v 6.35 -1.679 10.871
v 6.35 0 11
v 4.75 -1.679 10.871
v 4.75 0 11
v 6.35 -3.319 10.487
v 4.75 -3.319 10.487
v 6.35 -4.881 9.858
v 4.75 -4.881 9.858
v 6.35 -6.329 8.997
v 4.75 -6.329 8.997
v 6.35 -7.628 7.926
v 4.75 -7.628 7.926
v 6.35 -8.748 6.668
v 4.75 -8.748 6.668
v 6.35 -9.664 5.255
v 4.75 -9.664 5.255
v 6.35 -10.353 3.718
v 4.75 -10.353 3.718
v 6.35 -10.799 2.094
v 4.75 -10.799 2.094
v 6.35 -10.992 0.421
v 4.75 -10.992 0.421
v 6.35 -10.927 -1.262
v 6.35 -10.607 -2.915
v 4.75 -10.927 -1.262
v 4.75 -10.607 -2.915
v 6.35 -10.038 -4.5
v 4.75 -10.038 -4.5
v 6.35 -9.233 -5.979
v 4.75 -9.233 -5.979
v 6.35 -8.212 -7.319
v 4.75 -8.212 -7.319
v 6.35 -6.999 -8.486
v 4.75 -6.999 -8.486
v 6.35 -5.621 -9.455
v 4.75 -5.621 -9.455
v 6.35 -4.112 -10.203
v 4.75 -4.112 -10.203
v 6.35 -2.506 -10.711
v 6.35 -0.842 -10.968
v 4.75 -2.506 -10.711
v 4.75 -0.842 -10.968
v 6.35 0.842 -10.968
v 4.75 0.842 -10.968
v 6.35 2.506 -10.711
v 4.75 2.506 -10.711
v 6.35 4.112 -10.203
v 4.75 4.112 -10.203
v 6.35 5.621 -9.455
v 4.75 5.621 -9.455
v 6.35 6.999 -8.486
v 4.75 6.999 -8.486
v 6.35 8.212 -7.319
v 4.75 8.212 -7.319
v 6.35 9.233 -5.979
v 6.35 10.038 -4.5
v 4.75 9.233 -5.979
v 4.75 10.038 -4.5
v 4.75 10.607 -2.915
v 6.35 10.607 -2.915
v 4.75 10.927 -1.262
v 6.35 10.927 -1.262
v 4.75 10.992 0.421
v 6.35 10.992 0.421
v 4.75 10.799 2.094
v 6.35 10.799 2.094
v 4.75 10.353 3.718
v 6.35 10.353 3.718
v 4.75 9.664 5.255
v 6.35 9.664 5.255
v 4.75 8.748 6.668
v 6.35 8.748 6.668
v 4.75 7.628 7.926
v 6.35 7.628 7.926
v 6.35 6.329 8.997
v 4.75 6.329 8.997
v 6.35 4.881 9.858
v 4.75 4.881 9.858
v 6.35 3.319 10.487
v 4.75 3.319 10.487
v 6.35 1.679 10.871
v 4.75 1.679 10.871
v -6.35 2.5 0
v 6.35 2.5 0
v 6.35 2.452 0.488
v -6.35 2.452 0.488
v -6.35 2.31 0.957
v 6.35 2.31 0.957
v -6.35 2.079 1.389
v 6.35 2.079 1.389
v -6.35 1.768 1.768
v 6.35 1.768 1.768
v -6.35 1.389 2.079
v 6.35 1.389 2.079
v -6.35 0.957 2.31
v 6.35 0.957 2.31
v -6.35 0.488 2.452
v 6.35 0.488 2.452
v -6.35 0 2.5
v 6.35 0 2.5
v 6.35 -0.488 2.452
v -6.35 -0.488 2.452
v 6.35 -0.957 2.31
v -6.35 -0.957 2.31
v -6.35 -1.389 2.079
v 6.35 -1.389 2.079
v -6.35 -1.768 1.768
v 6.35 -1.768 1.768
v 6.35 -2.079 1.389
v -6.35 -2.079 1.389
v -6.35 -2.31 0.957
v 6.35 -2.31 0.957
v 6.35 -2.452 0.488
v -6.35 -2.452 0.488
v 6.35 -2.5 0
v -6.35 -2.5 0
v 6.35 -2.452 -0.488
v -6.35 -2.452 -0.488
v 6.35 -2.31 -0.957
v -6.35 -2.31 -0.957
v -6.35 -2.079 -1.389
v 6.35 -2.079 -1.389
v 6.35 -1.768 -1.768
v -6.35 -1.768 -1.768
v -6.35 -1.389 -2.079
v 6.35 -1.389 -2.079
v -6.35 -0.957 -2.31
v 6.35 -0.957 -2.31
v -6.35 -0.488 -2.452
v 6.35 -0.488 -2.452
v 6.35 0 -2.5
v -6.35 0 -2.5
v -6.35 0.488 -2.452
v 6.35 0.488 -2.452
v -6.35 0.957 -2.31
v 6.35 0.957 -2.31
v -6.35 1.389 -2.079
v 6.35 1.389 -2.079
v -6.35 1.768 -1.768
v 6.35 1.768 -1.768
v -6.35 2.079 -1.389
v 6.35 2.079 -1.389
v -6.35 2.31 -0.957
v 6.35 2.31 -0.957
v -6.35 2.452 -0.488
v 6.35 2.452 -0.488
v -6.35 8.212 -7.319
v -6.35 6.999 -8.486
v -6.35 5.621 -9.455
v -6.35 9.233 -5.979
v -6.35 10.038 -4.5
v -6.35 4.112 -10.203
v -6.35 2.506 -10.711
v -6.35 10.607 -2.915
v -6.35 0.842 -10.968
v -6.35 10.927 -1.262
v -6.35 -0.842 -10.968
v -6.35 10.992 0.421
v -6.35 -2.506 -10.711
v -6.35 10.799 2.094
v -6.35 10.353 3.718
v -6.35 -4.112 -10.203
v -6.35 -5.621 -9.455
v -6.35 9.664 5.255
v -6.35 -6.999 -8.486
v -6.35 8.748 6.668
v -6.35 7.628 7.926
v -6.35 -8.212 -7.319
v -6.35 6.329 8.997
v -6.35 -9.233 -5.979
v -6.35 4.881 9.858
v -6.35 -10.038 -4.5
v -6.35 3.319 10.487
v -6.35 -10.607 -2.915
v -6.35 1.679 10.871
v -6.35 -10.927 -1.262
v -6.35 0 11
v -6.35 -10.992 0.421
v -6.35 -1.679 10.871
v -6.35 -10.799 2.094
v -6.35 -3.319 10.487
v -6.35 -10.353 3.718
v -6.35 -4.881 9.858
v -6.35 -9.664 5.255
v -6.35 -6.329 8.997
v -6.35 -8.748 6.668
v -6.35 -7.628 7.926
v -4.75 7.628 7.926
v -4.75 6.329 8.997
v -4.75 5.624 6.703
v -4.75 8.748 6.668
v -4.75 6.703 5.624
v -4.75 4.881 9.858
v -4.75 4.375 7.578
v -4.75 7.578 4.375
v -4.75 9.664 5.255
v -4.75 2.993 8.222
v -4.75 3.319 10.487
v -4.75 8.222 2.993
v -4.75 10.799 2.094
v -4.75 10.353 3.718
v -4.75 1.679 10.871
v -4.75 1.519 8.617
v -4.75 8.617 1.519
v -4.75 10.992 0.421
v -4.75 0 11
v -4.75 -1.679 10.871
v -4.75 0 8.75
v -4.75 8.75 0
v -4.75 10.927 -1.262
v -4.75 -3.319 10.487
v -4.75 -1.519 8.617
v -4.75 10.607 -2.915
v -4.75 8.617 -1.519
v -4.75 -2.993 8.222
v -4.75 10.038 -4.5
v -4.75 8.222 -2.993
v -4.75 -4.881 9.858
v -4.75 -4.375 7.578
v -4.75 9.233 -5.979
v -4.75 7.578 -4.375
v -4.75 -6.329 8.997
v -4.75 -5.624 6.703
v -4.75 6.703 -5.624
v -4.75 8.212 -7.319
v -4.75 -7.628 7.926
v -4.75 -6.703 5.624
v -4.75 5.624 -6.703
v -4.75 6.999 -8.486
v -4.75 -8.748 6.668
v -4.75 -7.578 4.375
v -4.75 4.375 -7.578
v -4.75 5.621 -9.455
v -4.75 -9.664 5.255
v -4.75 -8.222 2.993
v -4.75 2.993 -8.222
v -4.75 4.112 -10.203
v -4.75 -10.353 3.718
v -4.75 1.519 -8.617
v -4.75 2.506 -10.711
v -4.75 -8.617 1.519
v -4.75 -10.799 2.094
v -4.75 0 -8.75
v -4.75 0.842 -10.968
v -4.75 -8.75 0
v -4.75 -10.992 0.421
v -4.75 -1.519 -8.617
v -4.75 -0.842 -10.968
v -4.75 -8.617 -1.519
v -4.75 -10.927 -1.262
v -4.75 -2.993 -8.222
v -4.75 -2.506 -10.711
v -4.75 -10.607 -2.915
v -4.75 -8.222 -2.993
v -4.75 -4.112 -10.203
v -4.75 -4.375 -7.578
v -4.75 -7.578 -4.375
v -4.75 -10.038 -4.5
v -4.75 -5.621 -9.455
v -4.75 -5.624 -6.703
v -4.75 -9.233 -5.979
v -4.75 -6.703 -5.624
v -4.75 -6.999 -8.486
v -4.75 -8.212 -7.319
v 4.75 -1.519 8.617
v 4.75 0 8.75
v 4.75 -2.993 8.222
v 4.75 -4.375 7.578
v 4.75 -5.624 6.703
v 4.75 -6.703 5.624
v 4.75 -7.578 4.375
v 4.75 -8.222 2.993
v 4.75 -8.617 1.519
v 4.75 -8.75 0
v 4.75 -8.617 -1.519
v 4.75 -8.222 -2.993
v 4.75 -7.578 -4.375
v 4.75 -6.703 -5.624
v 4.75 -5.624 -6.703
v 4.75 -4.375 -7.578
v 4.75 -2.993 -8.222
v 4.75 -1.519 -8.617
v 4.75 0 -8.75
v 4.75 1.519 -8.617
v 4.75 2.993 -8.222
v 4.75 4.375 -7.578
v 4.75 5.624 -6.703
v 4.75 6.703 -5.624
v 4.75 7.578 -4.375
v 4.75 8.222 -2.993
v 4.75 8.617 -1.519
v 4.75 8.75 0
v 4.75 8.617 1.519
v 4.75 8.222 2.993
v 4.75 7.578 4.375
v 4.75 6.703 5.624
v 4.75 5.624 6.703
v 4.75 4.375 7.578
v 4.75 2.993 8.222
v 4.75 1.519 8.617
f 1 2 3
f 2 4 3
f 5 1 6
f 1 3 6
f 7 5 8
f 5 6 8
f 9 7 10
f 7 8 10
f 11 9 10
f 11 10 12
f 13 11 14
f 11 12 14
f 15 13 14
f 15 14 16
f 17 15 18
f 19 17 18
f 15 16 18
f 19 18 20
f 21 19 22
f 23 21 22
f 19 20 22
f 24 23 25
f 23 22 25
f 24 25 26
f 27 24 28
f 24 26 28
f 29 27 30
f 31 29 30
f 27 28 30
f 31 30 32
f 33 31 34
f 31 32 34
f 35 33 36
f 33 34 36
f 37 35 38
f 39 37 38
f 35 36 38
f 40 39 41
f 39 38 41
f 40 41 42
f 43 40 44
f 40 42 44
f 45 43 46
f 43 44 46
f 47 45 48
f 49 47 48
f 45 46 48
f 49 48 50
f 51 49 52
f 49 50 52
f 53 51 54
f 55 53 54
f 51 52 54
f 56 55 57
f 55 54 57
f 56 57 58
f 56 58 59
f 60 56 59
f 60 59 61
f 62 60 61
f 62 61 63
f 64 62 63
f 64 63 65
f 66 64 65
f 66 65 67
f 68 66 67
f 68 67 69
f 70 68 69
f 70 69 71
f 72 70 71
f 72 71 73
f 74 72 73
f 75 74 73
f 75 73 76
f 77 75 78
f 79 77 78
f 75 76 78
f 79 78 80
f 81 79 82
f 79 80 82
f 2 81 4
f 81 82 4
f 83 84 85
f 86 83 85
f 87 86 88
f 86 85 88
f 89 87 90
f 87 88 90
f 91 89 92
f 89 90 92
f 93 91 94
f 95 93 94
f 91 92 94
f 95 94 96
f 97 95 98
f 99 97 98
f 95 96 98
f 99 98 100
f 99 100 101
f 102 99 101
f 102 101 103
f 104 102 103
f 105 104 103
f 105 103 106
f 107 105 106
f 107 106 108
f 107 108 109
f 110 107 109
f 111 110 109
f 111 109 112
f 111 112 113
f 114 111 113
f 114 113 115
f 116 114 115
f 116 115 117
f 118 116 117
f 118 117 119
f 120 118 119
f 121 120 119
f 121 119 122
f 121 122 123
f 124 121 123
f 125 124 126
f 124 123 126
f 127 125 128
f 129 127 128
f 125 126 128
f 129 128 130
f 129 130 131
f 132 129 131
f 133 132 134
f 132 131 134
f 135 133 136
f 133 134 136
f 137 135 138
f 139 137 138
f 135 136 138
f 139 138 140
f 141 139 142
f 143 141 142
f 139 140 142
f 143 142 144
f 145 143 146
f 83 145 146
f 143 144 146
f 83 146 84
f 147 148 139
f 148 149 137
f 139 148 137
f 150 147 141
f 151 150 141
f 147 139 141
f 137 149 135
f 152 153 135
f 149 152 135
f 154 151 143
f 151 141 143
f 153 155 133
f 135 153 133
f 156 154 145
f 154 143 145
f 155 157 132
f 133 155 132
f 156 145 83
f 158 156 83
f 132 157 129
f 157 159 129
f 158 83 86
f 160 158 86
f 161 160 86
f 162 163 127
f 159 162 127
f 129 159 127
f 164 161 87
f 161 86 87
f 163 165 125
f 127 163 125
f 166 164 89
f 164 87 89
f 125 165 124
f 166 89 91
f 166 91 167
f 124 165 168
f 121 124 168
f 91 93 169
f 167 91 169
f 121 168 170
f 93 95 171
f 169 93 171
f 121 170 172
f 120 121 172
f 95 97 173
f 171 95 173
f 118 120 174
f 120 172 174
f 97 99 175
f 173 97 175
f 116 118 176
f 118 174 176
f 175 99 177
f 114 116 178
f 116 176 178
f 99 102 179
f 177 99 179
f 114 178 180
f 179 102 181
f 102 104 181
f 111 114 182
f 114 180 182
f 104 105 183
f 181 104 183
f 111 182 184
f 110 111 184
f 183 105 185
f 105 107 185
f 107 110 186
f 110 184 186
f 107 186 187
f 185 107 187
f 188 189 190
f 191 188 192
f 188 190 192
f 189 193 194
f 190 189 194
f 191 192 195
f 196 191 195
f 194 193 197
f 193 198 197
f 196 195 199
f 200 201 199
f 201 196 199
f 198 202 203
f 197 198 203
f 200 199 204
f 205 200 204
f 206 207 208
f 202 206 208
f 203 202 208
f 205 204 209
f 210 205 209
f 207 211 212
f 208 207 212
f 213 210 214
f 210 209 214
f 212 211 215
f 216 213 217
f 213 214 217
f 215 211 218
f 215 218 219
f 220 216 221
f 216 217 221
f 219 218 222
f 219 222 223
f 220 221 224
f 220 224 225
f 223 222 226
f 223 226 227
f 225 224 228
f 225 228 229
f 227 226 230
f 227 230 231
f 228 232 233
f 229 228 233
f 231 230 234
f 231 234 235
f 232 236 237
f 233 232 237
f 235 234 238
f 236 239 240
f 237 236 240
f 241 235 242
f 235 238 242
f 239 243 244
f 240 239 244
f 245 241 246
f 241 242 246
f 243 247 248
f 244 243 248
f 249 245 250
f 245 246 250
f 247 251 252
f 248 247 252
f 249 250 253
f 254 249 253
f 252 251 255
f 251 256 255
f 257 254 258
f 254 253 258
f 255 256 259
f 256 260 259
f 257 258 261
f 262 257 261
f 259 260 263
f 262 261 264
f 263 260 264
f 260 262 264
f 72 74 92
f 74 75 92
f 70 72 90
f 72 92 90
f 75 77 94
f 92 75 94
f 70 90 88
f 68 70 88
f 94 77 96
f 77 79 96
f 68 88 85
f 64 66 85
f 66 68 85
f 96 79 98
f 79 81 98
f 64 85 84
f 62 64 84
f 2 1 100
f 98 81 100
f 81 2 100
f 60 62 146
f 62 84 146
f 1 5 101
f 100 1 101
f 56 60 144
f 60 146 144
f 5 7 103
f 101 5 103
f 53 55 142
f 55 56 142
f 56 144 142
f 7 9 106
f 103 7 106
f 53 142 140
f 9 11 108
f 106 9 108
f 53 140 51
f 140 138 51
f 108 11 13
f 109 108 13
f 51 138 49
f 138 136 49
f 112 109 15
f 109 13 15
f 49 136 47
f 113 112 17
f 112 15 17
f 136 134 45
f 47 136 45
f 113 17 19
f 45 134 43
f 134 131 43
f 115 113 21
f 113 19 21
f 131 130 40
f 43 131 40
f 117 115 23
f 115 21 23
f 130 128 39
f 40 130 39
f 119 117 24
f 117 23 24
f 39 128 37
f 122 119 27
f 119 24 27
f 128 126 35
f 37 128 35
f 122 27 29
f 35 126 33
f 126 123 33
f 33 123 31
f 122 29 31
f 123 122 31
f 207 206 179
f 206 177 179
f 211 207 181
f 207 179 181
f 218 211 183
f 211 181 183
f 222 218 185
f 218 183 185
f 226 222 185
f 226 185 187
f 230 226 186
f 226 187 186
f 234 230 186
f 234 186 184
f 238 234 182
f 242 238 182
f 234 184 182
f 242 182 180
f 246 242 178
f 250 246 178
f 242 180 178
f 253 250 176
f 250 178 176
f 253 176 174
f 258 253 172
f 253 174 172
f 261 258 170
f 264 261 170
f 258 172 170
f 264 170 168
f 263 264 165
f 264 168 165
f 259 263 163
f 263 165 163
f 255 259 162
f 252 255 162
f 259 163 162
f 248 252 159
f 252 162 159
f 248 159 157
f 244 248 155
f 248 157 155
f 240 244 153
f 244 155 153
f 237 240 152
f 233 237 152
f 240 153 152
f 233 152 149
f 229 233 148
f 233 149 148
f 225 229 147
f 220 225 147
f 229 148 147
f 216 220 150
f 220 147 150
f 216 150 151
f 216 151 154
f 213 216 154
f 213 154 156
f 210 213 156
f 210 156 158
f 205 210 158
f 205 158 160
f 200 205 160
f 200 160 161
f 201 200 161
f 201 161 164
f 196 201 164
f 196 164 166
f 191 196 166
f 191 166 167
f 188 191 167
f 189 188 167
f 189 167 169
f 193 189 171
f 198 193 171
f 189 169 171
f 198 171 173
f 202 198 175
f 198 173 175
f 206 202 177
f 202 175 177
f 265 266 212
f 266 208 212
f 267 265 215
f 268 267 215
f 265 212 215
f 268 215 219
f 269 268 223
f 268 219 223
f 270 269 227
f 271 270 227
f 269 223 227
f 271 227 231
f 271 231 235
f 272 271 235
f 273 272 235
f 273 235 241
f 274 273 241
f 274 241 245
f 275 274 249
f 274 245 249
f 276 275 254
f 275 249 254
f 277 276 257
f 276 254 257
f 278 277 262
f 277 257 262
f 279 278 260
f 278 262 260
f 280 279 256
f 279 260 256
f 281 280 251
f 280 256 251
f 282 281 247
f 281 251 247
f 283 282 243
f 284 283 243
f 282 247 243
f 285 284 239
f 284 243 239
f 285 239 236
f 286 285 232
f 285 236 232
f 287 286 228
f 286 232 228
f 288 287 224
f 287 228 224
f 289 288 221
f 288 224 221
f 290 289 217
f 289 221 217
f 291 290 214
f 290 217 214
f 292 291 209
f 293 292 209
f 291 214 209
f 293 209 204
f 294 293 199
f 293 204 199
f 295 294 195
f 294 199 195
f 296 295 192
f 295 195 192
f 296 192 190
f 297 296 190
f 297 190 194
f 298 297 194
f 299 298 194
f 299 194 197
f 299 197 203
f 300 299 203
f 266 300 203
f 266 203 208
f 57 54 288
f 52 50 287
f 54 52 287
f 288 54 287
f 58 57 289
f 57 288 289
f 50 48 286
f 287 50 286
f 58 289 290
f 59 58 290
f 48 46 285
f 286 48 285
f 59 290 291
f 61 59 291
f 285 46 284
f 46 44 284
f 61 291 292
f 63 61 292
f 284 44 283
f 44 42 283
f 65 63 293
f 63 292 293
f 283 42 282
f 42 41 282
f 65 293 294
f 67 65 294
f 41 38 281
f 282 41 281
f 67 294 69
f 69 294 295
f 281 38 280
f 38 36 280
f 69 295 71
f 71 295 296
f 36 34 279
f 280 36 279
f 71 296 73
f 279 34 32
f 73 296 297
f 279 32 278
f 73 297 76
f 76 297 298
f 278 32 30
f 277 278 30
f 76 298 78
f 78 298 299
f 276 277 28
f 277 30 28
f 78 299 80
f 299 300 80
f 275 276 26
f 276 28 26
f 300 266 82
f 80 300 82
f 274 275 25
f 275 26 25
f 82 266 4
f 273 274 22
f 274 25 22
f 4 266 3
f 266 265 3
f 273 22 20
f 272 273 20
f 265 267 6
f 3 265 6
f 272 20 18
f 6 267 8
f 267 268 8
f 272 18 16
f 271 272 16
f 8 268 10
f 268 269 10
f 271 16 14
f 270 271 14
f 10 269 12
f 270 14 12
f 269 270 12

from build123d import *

# Parameters (mm, degrees)
F2_R     = 2.5
F3_DEPTH = 12.701


with BuildPart() as f1:
    # F0 (on Front) → F1 (revolve)
    with BuildSketch(Plane.XZ):
        Polygon((-6.35, 11), (-6.35, 0), (6.35, 0), (6.35, 11), (4.75, 11), (4.75, 8.75), (-4.75, 8.75), (-4.75, 11), align=None)
    revolve(axis=Axis((-12.864703, 0, 0), (1, 0, 0)))

    # F2 (on face) → F3 (cut, through all)
    with BuildSketch(Plane.YZ.offset(6.35)):
        Circle(F2_R)
    extrude(amount=-F3_DEPTH, mode=Mode.SUBTRACT)


solid = f1.part
